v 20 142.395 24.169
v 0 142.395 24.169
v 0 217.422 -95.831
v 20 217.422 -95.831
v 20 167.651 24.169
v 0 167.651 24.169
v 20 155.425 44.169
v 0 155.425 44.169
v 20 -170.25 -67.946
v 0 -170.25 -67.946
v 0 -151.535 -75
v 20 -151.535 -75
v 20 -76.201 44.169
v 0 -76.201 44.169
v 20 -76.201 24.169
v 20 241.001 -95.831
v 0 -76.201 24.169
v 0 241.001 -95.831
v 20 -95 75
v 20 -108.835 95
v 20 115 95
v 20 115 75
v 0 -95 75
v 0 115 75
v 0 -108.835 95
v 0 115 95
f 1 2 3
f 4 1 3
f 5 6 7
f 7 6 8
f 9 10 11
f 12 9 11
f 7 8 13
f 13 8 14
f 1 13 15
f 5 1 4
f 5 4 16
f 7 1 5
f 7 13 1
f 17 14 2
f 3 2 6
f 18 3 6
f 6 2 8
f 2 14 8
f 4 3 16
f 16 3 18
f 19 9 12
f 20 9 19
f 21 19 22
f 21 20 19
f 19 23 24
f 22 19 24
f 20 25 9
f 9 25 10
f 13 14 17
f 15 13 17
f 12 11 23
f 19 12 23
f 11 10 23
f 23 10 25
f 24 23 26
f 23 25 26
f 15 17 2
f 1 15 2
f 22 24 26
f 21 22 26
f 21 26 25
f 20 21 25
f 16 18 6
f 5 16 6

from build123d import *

# Parameters (mm, degrees)
F2_DEPTH = 20
F3_DEPTH = 20


with BuildPart() as f2:
    # F1 (on Right) → F2 (new body)
    with BuildSketch(Plane.YZ):
        Polygon((-151.5351831913, -75), (-95, 75), (-49.1520948708, 75), (-49.1520948708, 95), (-108.8353658587, 95), (-170.2500428688, -67.9463465316), align=None)
        Polygon((-49.1520948708, 95), (-49.1520948708, 75), (95, 75), (115, 75), (115, 95), (95, 95), align=None)
    extrude(amount=F2_DEPTH)


with BuildPart() as f3:
    # F0 (on Right) → F3 (new body)
    with BuildSketch(Plane.YZ):
        Polygon((217.7155762911, -95.8306404948), (241.000726819, -95.8306404948), (167.650522438, 24.1693595052), (142.3945370404, 24.1693595052), (217.4223265664, -95.8306404948), align=None)
        Polygon((142.3945370404, 24.1693595052), (167.650522438, 24.1693595052), (155.4254883744, 44.1693595052), (129.8899054527, 44.1693595052), align=None)
        Polygon((-76.201092194, 24.1693595052), (142.3945370404, 24.1693595052), (129.8899054527, 44.1693595052), (-76.201092194, 44.1693595052), align=None)
    extrude(amount=F3_DEPTH)


solid = Compound([f2.part, f3.part])
